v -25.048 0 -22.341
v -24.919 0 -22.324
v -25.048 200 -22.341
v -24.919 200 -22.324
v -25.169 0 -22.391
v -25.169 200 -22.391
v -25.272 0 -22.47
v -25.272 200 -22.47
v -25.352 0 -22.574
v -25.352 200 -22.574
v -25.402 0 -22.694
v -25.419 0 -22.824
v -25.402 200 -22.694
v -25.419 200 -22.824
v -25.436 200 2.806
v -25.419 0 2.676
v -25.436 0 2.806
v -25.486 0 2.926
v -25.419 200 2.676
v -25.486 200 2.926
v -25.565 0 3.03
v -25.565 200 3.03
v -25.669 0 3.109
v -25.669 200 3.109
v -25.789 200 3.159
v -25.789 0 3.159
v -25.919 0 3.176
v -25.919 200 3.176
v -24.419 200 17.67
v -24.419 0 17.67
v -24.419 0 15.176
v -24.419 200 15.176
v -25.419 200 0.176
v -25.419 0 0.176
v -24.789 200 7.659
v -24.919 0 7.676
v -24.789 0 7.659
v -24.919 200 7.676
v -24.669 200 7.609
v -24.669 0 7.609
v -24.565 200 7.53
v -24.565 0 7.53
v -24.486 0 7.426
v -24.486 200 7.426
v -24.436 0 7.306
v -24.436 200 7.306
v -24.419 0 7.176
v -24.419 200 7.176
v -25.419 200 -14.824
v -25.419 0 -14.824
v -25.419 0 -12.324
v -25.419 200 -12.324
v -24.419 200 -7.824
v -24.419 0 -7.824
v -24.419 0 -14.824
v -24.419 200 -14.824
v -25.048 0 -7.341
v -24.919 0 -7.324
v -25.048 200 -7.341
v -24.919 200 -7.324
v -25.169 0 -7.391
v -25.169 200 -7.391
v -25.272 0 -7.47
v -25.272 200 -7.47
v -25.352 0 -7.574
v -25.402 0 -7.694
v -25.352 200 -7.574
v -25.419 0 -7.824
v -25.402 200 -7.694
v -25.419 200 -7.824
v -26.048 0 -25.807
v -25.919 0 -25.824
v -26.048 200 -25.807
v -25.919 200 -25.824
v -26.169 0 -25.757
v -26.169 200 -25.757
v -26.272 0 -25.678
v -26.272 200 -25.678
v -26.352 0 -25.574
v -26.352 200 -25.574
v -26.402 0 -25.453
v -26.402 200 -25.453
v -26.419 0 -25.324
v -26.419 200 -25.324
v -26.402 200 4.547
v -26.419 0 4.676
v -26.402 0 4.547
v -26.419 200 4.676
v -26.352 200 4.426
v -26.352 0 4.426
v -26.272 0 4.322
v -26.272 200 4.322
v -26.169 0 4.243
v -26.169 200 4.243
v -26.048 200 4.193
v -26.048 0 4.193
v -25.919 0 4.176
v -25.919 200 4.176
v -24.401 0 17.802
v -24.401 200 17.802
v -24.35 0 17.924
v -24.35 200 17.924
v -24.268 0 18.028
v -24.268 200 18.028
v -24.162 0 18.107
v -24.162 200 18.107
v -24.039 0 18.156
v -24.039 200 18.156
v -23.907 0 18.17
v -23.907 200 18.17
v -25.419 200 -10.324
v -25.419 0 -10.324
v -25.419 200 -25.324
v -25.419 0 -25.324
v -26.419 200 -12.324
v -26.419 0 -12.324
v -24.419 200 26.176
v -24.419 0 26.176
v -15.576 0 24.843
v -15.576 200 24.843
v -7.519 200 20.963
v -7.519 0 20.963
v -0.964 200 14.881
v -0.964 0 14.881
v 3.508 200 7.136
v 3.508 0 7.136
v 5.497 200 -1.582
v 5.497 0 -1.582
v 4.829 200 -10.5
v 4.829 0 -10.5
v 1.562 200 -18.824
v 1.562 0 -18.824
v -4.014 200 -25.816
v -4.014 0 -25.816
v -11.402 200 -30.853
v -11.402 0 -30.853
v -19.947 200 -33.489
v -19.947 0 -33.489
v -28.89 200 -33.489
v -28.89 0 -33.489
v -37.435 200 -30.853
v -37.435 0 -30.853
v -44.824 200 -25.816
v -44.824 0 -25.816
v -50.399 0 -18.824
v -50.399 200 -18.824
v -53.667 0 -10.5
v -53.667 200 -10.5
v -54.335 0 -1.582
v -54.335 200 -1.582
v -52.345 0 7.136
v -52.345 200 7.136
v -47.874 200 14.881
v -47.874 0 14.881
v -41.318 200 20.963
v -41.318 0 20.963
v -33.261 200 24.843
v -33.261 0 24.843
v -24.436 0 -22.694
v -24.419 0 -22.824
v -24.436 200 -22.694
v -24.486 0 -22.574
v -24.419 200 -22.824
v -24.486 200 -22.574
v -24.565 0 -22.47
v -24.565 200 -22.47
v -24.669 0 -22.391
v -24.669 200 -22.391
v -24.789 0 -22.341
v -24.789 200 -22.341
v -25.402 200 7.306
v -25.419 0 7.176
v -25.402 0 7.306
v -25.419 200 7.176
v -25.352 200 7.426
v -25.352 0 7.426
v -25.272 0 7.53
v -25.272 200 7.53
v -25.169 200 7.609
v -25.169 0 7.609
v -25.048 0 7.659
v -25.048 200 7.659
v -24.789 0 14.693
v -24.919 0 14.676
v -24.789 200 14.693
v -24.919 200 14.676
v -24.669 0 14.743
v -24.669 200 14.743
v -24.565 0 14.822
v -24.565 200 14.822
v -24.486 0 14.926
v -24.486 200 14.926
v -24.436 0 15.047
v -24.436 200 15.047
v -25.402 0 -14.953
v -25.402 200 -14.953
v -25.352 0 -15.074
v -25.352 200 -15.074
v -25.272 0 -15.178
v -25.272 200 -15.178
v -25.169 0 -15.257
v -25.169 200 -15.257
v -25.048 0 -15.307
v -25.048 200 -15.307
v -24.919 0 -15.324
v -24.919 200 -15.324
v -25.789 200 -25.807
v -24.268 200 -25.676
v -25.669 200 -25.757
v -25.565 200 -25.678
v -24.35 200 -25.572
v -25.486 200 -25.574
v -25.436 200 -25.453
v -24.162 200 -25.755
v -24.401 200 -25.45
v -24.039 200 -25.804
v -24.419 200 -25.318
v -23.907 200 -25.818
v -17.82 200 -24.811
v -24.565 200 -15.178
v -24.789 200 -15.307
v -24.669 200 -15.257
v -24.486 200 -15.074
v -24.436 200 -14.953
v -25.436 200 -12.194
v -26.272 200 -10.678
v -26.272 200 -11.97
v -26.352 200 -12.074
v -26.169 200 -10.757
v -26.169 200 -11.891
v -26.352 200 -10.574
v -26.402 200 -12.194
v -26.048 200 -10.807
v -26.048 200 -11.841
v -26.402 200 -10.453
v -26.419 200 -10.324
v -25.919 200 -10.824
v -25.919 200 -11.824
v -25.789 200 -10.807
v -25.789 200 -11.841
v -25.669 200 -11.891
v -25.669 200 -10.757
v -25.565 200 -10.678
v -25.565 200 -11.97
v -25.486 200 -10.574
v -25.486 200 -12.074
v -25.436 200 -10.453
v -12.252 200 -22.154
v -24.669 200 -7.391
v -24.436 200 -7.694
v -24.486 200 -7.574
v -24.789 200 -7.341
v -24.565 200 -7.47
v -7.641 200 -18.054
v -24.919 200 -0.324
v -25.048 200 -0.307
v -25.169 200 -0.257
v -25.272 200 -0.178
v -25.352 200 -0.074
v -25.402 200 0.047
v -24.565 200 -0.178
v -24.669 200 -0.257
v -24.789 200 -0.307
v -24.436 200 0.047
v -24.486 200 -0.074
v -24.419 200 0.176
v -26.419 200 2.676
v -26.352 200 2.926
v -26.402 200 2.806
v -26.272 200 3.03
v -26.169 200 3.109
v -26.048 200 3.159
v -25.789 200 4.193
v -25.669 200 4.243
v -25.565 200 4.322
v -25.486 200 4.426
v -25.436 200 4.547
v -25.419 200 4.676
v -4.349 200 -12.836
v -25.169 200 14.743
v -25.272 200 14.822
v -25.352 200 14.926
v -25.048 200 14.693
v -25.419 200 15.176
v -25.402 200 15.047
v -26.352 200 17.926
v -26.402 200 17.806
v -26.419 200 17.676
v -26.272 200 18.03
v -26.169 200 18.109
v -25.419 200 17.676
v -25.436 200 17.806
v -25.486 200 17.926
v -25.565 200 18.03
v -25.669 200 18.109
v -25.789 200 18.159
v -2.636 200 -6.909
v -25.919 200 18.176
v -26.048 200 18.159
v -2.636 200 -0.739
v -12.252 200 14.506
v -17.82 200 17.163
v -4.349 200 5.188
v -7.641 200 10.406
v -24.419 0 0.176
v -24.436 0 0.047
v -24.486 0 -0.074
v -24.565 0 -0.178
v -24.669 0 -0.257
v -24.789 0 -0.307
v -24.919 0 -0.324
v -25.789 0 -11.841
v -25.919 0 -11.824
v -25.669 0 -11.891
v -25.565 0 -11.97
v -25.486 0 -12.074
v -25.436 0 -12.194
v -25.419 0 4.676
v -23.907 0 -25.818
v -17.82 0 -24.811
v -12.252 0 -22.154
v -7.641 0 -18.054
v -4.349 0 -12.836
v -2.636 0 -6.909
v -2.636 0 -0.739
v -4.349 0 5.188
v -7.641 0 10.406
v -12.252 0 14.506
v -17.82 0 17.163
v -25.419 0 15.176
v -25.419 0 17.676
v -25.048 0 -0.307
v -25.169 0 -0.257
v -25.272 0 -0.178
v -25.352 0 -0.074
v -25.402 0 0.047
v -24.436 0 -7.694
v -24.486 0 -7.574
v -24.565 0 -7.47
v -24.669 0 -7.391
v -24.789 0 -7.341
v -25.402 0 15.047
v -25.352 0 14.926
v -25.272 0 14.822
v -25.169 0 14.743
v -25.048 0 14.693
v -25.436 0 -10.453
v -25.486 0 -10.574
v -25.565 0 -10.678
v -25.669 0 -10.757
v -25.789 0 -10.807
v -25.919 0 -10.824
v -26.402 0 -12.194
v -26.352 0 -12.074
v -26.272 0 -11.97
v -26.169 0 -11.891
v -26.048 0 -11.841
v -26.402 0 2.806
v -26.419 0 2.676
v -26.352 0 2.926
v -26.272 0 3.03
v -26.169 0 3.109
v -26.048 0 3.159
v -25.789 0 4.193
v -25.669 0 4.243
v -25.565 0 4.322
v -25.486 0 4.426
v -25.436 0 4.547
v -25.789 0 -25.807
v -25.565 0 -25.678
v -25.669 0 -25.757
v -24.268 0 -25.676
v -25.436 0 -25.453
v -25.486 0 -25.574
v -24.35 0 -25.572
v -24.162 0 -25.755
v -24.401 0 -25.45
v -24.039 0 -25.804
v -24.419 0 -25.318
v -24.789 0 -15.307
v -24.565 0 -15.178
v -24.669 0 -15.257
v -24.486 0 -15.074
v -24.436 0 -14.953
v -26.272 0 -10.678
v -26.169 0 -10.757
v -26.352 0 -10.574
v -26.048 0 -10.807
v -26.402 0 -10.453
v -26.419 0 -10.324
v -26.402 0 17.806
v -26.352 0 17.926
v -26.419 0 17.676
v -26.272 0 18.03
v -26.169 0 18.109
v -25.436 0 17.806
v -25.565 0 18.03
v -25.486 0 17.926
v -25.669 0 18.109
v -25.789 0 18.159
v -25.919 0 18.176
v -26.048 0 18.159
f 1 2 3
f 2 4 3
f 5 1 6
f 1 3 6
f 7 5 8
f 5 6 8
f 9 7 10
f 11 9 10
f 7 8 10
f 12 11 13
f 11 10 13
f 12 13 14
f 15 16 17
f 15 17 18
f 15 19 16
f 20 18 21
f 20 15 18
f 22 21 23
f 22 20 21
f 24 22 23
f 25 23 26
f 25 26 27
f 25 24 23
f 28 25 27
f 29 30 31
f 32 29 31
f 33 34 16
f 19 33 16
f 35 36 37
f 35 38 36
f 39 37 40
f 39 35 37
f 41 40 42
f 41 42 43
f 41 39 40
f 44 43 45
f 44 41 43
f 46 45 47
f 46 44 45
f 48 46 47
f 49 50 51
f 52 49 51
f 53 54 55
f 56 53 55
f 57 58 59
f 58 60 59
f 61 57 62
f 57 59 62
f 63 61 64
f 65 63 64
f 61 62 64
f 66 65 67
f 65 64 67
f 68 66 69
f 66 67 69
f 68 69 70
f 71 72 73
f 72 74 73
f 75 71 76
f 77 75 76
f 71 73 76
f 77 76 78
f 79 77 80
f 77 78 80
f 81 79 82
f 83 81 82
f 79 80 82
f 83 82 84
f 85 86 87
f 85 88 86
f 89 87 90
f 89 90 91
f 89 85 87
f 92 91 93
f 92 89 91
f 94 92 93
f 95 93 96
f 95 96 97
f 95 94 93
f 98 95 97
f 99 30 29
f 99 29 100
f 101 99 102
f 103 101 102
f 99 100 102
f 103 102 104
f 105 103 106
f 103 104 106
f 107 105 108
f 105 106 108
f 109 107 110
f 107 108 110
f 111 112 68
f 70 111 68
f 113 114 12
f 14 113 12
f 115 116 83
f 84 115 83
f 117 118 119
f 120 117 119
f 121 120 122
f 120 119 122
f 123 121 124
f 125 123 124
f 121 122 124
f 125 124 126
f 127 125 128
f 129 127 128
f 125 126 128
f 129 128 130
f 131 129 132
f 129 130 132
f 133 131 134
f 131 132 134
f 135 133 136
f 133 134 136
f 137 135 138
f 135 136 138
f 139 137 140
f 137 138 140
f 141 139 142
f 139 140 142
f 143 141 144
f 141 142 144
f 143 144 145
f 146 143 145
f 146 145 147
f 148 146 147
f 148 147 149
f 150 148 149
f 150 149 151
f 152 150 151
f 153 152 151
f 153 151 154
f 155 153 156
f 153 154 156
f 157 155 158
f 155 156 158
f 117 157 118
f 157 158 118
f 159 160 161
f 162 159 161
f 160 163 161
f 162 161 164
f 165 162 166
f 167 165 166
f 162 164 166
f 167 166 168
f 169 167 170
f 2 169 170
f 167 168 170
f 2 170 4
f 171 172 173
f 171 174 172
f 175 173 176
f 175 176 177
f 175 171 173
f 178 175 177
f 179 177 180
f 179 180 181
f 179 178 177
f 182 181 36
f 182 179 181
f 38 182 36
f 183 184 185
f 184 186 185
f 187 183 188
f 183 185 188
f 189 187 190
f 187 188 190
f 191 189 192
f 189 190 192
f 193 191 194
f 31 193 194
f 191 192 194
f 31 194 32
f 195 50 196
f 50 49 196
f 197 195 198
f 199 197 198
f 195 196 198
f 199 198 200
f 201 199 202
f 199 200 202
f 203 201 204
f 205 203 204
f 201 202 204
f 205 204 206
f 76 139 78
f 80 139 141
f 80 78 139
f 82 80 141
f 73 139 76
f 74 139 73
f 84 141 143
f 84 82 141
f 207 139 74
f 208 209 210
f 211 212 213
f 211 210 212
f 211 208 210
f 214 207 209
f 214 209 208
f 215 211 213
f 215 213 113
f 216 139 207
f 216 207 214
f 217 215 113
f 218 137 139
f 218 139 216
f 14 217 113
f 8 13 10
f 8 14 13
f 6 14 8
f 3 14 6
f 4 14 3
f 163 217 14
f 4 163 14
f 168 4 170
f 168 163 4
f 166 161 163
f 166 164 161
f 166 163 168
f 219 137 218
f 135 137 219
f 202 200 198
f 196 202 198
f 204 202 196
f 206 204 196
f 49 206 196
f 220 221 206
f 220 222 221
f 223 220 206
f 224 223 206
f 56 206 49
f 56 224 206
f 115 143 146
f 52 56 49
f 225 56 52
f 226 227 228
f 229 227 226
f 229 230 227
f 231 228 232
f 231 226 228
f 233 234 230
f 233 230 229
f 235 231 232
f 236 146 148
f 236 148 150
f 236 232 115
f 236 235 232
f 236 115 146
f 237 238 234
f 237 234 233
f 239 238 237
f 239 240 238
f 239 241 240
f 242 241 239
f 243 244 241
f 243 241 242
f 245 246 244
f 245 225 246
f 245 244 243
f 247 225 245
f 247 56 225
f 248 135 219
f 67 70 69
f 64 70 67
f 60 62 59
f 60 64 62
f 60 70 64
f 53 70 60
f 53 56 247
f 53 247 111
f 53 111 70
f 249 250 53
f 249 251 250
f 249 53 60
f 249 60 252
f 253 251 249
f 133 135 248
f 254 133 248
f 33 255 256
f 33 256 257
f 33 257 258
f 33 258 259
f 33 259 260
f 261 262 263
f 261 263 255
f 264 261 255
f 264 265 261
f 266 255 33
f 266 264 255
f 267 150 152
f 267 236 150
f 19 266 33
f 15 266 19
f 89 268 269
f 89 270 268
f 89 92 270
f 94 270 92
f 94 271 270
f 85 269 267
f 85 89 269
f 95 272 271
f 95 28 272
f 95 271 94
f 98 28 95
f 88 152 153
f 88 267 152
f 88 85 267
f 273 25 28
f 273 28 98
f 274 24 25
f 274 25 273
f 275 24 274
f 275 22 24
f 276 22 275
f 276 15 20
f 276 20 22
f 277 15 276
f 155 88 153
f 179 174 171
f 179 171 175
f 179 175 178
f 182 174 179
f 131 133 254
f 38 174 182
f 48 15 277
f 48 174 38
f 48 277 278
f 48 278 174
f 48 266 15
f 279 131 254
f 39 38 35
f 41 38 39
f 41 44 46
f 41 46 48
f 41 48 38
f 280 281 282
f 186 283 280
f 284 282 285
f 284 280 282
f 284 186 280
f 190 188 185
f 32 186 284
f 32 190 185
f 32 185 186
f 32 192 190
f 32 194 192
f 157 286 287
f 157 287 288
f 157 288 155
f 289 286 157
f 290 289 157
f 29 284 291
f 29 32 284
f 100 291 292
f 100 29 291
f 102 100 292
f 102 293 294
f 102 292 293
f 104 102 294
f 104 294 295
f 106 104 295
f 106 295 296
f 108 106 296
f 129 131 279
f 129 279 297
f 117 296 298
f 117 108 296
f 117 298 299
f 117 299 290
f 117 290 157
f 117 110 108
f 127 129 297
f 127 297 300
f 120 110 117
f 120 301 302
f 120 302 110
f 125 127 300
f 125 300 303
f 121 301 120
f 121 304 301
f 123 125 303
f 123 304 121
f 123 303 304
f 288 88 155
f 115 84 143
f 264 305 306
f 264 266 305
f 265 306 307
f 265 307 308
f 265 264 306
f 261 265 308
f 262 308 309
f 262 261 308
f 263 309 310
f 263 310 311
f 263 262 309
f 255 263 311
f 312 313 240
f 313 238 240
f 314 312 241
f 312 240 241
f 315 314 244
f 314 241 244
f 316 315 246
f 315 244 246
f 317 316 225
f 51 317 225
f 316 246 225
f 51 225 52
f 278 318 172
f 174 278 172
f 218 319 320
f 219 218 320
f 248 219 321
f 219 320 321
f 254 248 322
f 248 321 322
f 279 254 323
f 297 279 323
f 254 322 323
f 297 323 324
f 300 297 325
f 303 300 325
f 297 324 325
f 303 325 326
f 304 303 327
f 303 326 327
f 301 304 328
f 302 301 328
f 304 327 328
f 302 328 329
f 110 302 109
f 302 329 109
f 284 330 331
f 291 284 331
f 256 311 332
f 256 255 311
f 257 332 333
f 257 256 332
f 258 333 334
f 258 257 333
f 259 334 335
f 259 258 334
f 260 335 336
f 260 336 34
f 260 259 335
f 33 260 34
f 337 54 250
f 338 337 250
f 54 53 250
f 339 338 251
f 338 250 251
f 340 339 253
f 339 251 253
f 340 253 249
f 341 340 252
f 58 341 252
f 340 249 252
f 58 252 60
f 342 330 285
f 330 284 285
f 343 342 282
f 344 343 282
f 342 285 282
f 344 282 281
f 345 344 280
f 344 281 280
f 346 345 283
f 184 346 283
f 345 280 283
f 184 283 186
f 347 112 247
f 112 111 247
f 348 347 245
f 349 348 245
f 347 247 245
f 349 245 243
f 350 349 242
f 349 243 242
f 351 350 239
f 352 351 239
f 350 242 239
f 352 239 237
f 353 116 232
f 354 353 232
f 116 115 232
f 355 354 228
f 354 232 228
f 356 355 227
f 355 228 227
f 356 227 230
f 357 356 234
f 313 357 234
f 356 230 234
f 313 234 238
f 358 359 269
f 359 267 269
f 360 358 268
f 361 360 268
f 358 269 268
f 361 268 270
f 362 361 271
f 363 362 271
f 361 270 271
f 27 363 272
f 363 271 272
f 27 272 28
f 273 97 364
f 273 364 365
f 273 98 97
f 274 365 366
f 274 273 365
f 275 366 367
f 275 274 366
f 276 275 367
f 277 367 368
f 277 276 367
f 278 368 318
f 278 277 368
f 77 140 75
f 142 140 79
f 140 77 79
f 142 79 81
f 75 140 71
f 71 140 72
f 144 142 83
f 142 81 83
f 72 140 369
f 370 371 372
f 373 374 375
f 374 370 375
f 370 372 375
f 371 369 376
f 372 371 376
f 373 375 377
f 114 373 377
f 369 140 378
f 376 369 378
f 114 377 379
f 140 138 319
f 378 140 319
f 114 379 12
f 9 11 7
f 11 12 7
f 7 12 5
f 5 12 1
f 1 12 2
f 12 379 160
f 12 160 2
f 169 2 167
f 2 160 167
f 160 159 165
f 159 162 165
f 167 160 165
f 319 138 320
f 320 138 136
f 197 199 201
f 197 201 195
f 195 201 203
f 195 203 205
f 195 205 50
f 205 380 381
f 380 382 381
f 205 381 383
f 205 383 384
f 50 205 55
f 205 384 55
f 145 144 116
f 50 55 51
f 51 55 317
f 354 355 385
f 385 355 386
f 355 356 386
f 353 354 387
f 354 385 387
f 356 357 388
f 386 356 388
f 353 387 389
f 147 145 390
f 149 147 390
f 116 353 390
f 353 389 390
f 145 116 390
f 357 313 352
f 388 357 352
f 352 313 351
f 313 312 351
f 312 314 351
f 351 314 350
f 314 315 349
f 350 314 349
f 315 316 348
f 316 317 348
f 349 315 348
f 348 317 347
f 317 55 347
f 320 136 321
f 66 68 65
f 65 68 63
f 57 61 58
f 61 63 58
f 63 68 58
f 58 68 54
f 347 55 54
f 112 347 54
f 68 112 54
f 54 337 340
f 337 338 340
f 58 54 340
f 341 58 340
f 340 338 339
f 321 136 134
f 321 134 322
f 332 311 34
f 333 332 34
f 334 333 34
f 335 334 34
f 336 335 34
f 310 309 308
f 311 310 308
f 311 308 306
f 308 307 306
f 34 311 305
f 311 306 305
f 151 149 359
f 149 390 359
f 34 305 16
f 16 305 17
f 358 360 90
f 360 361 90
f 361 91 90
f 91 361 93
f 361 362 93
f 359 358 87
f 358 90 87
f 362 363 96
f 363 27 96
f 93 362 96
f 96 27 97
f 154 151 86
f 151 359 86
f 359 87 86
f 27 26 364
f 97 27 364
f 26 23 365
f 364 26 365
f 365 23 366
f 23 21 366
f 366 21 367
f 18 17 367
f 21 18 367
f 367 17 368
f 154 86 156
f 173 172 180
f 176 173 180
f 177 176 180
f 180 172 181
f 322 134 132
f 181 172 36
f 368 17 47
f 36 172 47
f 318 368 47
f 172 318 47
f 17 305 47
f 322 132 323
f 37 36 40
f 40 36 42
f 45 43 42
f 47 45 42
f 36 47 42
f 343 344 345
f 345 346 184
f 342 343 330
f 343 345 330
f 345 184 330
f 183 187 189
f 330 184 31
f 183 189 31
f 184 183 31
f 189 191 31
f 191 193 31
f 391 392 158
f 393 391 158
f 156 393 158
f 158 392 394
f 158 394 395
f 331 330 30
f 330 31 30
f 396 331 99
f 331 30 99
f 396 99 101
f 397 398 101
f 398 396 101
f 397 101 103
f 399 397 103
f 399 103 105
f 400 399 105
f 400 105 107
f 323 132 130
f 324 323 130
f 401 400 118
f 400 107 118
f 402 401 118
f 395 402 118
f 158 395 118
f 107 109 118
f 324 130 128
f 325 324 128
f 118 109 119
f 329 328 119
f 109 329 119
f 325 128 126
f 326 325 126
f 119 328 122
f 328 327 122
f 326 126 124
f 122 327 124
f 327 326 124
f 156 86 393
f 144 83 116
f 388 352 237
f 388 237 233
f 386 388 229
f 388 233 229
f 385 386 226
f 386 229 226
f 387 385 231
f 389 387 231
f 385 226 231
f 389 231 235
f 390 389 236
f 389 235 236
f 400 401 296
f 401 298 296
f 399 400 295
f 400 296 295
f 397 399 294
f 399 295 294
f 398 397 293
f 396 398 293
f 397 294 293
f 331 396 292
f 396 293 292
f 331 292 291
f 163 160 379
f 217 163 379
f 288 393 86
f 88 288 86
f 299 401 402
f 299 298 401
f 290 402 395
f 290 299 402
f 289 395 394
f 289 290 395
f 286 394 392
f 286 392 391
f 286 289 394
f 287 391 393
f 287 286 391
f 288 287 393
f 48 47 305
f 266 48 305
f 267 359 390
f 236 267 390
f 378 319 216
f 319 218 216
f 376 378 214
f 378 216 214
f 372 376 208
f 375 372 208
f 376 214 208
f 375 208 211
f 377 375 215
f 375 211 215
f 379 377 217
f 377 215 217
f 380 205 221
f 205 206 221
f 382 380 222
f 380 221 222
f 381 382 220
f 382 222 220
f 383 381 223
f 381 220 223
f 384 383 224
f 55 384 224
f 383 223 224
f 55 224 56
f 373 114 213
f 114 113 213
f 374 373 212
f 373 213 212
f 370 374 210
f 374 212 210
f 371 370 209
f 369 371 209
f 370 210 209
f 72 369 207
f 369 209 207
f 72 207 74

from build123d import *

# Parameters (mm, degrees)
SKETCH1_R           = 30
BOSS_EXTRUDE2_DEPTH = 200
FILLET1_R           = 0.5


with BuildPart() as part:
    # Sketch1 → Boss-Extrude2 (new body)
    # profile 1 of 2: a face of its own
    with BuildSketch(Plane(origin=(0, 0, 0), x_dir=(1, 0, 0), z_dir=(0, 1, 0))):
        with Locations(Location((-24.418699654, 3.823974383, 0), (0, 0, 270))):
            Circle(SKETCH1_R)
        with BuildLine():
            Line((-26.418699654, -18.176025617), (-26.418699654, -4.176025617))
            Line((-26.418699654, -4.176025617), (-26.418699654, -3.176025617))
            Line((-26.418699654, -3.176025617), (-26.418699654, 10.823974383))
            Line((-26.418699654, 10.823974383), (-25.418699654, 10.823974383))
            Line((-25.418699654, 10.823974383), (-25.418699654, 7.323974383))
            Line((-25.418699654, 7.323974383), (-24.418699654, 7.323974383))
            Line((-24.418699654, 7.323974383), (-24.418699654, 10.823974383))
            Line((-24.418699654, 10.823974383), (-24.418699654, 11.823974383))
            Line((-24.418699654, 11.823974383), (-24.418699654, 15.323974383))
            Line((-24.418699654, 15.323974383), (-25.418699654, 15.323974383))
            Line((-25.418699654, 15.323974383), (-25.418699654, 11.823974383))
            Line((-25.418699654, 11.823974383), (-26.418699654, 11.823974383))
            Line((-26.418699654, 11.823974383), (-26.418699654, 25.823974383))
            Line((-26.418699654, 25.823974383), (-25.418699654, 25.823974383))
            Line((-25.418699654, 25.823974383), (-25.418699654, 22.323974383))
            Line((-25.418699654, 22.323974383), (-24.418699654, 22.323974383))
            Line((-24.418699654, 22.323974383), (-24.418699654, 25.823974383))
            ThreePointArc((-24.418699654, 25.823974383), (-2.418699654, 3.823974383), (-24.418699654, -18.176025617))
            Line((-24.418699654, -18.176025617), (-24.418699654, -14.676025617))
            Line((-24.418699654, -14.676025617), (-25.418699654, -14.676025617))
            Line((-25.418699654, -14.676025617), (-25.418699654, -18.176025617))
            Line((-25.418699654, -18.176025617), (-26.418699654, -18.176025617))
        make_face(mode=Mode.SUBTRACT)
    # profile 2 of 2: a face of its own
    with BuildSketch(Plane(origin=(0, 0, 0), x_dir=(1, 0, 0), z_dir=(0, 1, 0))):
        Polygon((-26.418699654, -3.176025617), (-26.418699654, -4.176025617), (-25.418699654, -4.176025617), (-25.418699654, -7.676025617), (-24.418699654, -7.676025617), (-24.418699654, -4.176025617), (-24.418699654, -3.176025617), (-24.418699654, 0.323974383), (-25.418699654, 0.323974383), (-25.418699654, -3.176025617), align=None)
    extrude(amount=BOSS_EXTRUDE2_DEPTH)

    # Fillet1
    fillet1_edges = [part.edges().sort_by_distance(p)[0] for p in [
        (-24.418699654, 100, -25.823974383),
        (-25.418699654, 100, 3.176025617),
        (-25.418699654, 100, -0.323974383),
        (-25.418699654, 100, -15.323974383),
        (-25.418699654, 100, -11.823974383),
        (-25.418699654, 100, -25.823974383),
        (-25.418699654, 100, -22.323974383),
        (-25.418699654, 100, -7.323974383),
        (-25.418699654, 100, -10.823974383),
        (-25.418699654, 100, 4.176025617),
        (-24.418699654, 100, -0.323974383),
        (-24.418699654, 100, -15.323974383),
        (-26.418699654, 100, -11.823974383),
        (-26.418699654, 100, 3.176025617),
        (-26.418699654, 100, -25.823974383),
        (-24.418699654, 100, -22.323974383),
        (-24.418699654, 100, -7.323974383),
        (-26.418699654, 100, -10.823974383),
        (-26.418699654, 100, 4.176025617),
        (-24.418699654, 100, 7.676025617),
        (-25.418699654, 100, 7.676025617),
        (-25.418699654, 100, 14.676025617),
        (-24.418699654, 100, 14.676025617),
        (-24.418699654, 100, 18.176025617),
        (-26.418699654, 100, 18.176025617),
        (-25.418699654, 100, 18.176025617),
    ]]
    fillet(fillet1_edges, radius=FILLET1_R - 0.0001)  # a hair under: the kernel refuses the full size


solid = part.part
